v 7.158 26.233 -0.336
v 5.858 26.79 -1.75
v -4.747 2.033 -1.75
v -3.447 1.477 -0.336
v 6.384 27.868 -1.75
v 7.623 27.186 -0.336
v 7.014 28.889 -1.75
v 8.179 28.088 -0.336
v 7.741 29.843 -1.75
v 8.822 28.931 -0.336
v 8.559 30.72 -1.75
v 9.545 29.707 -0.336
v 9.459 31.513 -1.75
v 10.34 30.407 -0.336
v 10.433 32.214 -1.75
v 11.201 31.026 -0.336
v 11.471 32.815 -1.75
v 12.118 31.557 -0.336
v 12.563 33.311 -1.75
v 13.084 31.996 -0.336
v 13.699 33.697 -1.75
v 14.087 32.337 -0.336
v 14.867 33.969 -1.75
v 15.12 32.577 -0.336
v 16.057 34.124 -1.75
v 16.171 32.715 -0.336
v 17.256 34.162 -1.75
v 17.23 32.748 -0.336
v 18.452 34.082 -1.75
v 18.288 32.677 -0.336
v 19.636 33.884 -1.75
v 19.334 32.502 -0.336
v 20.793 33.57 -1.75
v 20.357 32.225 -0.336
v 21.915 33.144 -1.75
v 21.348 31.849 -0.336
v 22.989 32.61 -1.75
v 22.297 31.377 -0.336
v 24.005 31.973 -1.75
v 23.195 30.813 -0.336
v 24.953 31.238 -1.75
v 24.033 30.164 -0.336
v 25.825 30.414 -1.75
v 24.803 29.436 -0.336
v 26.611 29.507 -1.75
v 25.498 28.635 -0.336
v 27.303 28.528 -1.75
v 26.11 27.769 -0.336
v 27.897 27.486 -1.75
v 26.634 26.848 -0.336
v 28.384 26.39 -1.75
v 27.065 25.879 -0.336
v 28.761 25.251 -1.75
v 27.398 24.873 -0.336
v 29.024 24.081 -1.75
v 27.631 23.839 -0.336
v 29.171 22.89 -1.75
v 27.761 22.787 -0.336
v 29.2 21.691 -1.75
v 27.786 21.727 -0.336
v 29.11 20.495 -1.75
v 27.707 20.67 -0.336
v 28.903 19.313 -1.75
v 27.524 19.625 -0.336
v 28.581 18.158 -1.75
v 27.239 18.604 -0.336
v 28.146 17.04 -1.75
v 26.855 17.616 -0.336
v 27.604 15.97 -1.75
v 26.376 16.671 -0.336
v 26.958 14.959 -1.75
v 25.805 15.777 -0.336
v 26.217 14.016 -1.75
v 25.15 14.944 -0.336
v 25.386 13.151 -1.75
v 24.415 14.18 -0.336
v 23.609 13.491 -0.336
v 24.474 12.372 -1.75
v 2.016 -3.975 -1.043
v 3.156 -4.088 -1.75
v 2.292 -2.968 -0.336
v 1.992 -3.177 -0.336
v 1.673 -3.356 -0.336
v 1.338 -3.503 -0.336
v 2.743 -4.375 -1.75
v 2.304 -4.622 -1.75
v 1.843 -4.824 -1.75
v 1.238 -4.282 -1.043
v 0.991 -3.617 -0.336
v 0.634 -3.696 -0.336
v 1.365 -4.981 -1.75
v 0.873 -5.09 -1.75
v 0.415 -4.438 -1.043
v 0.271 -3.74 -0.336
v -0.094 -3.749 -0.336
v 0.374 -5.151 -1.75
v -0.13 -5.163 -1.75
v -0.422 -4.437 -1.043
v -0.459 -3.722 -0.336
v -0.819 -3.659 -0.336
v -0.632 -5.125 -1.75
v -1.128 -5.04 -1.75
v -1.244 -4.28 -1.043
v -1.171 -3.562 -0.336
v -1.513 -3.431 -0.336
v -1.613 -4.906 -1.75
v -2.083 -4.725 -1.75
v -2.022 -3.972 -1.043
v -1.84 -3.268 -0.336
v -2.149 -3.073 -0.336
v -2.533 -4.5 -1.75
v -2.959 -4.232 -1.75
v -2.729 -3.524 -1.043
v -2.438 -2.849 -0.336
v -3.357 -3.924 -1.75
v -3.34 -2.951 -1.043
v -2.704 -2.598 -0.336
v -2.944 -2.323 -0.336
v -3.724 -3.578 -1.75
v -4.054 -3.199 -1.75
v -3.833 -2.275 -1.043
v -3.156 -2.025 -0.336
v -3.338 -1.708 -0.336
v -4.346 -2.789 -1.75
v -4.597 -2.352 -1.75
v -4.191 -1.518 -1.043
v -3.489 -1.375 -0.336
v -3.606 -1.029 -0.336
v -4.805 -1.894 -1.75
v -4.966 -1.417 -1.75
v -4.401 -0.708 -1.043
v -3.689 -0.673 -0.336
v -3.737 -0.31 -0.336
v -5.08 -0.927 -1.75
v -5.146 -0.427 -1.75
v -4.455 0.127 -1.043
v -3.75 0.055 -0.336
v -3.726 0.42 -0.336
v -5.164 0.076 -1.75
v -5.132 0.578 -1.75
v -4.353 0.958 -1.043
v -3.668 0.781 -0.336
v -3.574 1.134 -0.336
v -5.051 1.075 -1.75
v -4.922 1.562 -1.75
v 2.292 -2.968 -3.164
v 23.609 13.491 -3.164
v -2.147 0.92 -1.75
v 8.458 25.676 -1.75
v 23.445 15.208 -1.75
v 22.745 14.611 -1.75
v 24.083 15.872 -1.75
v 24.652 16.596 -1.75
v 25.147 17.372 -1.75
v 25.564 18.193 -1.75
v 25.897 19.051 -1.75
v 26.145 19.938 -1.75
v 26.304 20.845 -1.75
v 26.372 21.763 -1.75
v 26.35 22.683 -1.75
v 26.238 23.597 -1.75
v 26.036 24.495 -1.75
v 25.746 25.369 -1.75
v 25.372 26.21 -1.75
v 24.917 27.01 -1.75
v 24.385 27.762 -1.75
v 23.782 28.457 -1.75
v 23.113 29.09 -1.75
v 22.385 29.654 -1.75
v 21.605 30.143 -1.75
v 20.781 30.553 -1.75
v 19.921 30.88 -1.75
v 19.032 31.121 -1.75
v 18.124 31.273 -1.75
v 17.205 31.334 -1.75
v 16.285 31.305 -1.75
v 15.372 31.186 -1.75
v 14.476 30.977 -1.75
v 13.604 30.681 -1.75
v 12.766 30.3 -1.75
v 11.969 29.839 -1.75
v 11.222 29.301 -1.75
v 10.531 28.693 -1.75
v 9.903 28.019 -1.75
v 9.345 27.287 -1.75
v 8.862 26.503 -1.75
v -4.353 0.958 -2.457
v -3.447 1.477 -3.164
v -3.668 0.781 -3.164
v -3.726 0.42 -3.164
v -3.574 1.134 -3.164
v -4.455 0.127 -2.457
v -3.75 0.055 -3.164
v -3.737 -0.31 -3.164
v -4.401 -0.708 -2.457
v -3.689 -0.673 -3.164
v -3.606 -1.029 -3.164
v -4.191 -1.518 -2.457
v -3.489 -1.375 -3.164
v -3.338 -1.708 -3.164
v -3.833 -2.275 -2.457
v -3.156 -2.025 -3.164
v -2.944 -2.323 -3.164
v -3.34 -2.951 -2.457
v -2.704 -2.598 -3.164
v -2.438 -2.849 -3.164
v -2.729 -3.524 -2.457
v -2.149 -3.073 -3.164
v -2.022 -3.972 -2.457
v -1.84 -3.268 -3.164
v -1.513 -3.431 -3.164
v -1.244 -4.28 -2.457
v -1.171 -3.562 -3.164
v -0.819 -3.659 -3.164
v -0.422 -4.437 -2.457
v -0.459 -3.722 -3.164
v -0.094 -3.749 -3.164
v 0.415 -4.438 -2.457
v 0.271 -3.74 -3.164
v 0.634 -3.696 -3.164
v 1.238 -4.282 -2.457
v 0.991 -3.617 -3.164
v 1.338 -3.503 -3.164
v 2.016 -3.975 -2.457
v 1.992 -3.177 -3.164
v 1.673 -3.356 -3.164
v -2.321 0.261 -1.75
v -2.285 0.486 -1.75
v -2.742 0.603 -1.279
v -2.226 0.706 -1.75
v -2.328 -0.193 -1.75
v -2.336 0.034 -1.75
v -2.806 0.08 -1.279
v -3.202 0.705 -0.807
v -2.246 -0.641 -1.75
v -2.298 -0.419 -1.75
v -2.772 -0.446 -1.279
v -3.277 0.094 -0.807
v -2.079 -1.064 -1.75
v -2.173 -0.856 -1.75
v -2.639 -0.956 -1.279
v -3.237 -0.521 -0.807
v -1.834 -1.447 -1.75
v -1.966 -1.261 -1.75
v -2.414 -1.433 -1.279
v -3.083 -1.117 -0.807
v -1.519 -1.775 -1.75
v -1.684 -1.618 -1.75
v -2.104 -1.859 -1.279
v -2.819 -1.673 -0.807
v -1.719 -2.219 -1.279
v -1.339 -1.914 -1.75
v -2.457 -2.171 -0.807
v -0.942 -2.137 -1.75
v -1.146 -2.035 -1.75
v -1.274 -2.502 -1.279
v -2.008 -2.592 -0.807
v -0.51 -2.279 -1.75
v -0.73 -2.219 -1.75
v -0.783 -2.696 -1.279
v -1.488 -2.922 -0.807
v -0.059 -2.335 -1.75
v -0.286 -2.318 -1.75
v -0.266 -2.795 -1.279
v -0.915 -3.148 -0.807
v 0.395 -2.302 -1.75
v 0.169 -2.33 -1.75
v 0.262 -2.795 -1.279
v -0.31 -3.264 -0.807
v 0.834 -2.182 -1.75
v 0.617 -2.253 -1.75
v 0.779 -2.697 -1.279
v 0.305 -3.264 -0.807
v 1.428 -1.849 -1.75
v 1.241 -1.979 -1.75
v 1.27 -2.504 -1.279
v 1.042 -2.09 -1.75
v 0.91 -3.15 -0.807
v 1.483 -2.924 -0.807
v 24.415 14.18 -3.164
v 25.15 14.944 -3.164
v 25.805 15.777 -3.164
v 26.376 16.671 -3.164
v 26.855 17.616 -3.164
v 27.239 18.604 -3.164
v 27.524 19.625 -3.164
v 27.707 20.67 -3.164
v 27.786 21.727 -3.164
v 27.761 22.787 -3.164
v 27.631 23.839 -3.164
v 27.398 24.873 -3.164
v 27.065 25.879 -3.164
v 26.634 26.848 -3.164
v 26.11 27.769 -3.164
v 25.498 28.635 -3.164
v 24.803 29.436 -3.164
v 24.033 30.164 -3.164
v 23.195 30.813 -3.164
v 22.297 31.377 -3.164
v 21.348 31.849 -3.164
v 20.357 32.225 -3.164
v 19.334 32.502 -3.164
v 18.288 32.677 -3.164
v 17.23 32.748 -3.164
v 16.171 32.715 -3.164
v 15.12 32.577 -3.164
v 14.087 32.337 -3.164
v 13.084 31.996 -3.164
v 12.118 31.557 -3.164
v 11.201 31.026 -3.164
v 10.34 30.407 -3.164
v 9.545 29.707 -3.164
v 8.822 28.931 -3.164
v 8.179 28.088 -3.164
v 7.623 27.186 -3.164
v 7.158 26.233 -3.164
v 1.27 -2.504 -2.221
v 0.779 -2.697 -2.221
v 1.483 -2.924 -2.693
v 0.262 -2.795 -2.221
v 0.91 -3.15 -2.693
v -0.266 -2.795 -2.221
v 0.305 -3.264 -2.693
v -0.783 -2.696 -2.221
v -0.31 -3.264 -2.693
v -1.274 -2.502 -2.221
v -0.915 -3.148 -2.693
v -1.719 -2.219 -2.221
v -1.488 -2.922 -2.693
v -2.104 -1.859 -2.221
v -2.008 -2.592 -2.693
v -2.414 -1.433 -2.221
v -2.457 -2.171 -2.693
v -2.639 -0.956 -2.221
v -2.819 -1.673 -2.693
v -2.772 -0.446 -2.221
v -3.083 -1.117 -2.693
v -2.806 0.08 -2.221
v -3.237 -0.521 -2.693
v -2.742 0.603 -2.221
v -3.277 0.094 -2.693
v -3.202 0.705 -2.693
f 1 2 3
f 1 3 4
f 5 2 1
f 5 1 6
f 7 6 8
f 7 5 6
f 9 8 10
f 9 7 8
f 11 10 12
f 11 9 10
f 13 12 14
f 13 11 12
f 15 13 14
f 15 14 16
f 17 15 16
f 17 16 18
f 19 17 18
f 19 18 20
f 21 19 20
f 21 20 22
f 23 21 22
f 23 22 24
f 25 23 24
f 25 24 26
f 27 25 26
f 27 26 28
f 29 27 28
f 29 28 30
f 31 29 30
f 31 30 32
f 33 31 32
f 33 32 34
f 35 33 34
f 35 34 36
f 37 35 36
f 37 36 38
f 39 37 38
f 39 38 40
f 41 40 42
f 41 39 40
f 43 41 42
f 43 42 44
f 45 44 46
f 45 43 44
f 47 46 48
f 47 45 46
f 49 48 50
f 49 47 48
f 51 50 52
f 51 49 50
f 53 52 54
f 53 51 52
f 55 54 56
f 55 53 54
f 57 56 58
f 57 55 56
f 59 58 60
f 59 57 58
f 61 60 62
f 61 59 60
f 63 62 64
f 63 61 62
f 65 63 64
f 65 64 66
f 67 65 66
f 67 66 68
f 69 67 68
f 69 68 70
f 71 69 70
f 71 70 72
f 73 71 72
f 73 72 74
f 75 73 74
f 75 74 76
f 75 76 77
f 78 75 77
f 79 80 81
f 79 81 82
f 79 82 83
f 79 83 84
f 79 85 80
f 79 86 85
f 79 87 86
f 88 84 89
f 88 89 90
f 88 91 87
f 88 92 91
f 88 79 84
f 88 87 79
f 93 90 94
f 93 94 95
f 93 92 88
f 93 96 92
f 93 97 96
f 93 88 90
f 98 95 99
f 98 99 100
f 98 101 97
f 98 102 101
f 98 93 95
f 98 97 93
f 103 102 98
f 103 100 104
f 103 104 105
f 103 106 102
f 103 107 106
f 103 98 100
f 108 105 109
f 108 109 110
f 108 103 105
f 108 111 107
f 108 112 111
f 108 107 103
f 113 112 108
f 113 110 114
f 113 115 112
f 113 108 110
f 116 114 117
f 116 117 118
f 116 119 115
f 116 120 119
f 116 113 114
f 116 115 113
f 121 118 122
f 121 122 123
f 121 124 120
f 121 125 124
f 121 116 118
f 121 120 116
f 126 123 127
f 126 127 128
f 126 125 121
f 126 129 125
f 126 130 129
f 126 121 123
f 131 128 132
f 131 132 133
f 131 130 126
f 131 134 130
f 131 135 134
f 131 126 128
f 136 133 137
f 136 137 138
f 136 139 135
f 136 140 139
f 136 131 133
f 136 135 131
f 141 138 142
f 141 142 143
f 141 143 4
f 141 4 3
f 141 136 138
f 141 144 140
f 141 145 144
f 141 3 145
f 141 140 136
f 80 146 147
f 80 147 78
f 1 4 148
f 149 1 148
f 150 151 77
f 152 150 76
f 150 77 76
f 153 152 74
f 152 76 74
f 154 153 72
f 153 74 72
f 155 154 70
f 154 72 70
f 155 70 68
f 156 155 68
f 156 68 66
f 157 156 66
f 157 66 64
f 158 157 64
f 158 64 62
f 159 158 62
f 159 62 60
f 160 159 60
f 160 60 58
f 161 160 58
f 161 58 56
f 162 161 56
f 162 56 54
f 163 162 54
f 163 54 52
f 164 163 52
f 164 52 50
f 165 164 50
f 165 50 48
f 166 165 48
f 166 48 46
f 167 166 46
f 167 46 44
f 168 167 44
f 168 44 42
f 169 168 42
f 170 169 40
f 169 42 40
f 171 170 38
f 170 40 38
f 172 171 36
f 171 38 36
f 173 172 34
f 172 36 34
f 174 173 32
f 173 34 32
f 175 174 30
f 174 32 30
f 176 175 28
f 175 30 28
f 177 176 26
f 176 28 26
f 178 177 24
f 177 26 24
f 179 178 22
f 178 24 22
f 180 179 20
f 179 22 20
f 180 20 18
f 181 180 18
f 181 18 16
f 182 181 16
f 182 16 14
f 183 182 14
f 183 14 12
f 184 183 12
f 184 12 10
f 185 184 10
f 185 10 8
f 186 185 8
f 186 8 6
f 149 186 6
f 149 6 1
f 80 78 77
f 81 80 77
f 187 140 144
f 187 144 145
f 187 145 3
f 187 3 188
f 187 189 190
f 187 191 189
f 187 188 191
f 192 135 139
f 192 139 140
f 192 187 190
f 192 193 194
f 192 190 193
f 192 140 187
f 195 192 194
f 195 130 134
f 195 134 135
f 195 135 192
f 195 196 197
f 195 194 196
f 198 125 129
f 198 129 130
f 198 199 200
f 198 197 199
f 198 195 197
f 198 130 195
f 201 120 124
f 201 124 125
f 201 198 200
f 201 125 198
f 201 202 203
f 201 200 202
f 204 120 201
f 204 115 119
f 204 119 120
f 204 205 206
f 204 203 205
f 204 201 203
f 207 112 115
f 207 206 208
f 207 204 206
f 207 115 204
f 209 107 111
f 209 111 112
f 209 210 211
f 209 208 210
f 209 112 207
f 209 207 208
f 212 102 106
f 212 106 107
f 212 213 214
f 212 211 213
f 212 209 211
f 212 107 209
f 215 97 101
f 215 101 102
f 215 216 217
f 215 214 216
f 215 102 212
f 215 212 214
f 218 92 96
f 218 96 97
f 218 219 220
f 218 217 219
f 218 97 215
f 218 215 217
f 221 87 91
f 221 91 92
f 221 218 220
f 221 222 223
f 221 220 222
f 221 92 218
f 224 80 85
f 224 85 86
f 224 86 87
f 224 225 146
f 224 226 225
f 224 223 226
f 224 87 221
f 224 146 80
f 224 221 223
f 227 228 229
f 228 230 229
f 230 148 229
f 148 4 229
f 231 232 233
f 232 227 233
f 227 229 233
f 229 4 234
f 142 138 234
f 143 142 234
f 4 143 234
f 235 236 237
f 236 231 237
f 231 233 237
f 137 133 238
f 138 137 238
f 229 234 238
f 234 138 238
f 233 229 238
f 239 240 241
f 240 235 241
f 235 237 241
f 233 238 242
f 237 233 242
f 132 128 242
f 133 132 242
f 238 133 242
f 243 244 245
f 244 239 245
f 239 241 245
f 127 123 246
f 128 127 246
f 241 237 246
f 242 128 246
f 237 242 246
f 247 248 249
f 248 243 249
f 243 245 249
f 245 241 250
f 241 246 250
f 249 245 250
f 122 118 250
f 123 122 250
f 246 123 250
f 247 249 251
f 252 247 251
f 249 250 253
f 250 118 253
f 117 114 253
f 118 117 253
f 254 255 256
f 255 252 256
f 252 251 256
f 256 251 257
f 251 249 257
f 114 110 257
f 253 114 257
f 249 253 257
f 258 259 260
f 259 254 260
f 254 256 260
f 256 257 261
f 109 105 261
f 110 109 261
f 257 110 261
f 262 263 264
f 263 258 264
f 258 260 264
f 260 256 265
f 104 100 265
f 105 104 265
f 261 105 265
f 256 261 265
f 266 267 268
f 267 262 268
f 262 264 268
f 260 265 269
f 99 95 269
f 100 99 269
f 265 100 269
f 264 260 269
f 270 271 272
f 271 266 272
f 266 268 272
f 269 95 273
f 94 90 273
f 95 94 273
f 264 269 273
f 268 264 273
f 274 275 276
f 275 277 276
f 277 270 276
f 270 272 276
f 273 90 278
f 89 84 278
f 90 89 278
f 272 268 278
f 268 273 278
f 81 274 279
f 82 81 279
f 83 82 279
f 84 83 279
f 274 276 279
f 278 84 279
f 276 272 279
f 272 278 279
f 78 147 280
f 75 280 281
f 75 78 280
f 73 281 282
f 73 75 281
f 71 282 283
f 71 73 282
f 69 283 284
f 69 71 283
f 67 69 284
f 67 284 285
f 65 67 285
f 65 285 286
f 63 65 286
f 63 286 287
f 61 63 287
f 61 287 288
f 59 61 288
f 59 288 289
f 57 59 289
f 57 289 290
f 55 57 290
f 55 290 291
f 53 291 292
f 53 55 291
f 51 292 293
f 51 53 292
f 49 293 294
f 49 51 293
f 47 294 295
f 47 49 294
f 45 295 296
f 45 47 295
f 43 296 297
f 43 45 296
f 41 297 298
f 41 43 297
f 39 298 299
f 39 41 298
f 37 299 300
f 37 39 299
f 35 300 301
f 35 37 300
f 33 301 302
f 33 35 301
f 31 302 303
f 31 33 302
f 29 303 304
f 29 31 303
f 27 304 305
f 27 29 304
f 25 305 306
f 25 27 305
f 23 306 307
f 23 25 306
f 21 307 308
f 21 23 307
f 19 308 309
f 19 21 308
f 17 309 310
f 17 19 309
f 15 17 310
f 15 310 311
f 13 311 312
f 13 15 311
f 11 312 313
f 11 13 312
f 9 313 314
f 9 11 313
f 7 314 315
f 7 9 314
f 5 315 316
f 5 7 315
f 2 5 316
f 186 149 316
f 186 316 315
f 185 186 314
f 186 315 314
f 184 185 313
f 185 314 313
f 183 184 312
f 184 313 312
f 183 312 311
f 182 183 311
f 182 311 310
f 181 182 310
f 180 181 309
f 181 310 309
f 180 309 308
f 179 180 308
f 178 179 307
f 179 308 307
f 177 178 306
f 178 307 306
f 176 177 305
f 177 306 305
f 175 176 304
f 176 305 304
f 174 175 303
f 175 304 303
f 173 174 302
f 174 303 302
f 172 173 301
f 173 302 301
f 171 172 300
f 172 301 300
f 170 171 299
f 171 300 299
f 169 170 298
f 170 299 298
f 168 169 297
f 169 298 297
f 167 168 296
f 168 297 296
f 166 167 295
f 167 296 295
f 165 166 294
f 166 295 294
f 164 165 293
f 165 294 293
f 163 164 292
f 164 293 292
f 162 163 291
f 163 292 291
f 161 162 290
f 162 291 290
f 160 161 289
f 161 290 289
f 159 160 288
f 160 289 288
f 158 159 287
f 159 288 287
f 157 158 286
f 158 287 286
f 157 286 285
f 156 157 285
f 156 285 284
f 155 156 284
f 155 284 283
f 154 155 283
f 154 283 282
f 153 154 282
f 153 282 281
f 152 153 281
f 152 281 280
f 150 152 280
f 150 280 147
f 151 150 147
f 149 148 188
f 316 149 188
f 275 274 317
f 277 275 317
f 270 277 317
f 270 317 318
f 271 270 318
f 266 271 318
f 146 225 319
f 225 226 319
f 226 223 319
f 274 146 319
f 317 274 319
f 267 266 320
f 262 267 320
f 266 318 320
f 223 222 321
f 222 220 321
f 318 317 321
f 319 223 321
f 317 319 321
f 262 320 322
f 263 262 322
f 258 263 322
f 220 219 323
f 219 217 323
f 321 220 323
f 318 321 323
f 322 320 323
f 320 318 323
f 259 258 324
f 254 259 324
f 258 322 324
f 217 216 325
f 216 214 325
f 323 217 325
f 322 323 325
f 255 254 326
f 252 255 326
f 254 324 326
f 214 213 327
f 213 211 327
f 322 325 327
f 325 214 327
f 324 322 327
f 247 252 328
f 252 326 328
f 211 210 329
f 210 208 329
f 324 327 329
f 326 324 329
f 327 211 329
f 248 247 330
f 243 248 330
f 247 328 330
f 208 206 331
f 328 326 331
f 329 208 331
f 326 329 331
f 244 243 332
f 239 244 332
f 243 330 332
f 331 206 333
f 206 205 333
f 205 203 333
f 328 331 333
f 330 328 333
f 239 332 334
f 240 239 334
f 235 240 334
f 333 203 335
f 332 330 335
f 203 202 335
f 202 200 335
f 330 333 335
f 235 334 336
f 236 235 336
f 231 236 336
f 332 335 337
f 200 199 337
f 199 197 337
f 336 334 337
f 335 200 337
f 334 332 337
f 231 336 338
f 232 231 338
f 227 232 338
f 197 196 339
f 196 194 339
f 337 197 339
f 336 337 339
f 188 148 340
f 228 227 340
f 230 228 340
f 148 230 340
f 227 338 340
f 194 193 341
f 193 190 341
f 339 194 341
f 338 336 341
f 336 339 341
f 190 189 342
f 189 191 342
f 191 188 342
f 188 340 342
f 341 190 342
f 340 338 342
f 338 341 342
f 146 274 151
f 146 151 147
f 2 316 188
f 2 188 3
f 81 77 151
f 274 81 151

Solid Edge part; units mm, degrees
sketch "Sketch1" plane through (0, 0, -1.75) normal (0, 0, 1) x (1, 0, 0)
  line L0 (-3.447, 1.4766) -> (7.158, 26.233)
  line L1 (2.2918, -2.9682) -> (23.6093, 13.4911)
  arc A0 (23.6093, 13.4911) -> (7.158, 26.233) centre (17.0395, 22) ccw
  arc A1 (2.2918, -2.9682) -> (-3.447, 1.4766) centre (0, 0) cw
sketch "Sketch2" plane through (17.0395, 0, 0) normal (-1, 0, 0) x (0, -1, 0)
  line L0 (-32.75, -0.3358) -> (-31.3358, -1.75)
  line L1 (-32.75, -3.1642) -> (-31.3358, -1.75)
  line L2 (-32.75, -3.1642) -> (-34.1642, -1.75)
  line L3 (-32.75, -0.3358) -> (-34.1642, -1.75)
sweep "Riemen_Twist" add profiles "Sketch2" path "Sketch1"
properties material "(None)"
